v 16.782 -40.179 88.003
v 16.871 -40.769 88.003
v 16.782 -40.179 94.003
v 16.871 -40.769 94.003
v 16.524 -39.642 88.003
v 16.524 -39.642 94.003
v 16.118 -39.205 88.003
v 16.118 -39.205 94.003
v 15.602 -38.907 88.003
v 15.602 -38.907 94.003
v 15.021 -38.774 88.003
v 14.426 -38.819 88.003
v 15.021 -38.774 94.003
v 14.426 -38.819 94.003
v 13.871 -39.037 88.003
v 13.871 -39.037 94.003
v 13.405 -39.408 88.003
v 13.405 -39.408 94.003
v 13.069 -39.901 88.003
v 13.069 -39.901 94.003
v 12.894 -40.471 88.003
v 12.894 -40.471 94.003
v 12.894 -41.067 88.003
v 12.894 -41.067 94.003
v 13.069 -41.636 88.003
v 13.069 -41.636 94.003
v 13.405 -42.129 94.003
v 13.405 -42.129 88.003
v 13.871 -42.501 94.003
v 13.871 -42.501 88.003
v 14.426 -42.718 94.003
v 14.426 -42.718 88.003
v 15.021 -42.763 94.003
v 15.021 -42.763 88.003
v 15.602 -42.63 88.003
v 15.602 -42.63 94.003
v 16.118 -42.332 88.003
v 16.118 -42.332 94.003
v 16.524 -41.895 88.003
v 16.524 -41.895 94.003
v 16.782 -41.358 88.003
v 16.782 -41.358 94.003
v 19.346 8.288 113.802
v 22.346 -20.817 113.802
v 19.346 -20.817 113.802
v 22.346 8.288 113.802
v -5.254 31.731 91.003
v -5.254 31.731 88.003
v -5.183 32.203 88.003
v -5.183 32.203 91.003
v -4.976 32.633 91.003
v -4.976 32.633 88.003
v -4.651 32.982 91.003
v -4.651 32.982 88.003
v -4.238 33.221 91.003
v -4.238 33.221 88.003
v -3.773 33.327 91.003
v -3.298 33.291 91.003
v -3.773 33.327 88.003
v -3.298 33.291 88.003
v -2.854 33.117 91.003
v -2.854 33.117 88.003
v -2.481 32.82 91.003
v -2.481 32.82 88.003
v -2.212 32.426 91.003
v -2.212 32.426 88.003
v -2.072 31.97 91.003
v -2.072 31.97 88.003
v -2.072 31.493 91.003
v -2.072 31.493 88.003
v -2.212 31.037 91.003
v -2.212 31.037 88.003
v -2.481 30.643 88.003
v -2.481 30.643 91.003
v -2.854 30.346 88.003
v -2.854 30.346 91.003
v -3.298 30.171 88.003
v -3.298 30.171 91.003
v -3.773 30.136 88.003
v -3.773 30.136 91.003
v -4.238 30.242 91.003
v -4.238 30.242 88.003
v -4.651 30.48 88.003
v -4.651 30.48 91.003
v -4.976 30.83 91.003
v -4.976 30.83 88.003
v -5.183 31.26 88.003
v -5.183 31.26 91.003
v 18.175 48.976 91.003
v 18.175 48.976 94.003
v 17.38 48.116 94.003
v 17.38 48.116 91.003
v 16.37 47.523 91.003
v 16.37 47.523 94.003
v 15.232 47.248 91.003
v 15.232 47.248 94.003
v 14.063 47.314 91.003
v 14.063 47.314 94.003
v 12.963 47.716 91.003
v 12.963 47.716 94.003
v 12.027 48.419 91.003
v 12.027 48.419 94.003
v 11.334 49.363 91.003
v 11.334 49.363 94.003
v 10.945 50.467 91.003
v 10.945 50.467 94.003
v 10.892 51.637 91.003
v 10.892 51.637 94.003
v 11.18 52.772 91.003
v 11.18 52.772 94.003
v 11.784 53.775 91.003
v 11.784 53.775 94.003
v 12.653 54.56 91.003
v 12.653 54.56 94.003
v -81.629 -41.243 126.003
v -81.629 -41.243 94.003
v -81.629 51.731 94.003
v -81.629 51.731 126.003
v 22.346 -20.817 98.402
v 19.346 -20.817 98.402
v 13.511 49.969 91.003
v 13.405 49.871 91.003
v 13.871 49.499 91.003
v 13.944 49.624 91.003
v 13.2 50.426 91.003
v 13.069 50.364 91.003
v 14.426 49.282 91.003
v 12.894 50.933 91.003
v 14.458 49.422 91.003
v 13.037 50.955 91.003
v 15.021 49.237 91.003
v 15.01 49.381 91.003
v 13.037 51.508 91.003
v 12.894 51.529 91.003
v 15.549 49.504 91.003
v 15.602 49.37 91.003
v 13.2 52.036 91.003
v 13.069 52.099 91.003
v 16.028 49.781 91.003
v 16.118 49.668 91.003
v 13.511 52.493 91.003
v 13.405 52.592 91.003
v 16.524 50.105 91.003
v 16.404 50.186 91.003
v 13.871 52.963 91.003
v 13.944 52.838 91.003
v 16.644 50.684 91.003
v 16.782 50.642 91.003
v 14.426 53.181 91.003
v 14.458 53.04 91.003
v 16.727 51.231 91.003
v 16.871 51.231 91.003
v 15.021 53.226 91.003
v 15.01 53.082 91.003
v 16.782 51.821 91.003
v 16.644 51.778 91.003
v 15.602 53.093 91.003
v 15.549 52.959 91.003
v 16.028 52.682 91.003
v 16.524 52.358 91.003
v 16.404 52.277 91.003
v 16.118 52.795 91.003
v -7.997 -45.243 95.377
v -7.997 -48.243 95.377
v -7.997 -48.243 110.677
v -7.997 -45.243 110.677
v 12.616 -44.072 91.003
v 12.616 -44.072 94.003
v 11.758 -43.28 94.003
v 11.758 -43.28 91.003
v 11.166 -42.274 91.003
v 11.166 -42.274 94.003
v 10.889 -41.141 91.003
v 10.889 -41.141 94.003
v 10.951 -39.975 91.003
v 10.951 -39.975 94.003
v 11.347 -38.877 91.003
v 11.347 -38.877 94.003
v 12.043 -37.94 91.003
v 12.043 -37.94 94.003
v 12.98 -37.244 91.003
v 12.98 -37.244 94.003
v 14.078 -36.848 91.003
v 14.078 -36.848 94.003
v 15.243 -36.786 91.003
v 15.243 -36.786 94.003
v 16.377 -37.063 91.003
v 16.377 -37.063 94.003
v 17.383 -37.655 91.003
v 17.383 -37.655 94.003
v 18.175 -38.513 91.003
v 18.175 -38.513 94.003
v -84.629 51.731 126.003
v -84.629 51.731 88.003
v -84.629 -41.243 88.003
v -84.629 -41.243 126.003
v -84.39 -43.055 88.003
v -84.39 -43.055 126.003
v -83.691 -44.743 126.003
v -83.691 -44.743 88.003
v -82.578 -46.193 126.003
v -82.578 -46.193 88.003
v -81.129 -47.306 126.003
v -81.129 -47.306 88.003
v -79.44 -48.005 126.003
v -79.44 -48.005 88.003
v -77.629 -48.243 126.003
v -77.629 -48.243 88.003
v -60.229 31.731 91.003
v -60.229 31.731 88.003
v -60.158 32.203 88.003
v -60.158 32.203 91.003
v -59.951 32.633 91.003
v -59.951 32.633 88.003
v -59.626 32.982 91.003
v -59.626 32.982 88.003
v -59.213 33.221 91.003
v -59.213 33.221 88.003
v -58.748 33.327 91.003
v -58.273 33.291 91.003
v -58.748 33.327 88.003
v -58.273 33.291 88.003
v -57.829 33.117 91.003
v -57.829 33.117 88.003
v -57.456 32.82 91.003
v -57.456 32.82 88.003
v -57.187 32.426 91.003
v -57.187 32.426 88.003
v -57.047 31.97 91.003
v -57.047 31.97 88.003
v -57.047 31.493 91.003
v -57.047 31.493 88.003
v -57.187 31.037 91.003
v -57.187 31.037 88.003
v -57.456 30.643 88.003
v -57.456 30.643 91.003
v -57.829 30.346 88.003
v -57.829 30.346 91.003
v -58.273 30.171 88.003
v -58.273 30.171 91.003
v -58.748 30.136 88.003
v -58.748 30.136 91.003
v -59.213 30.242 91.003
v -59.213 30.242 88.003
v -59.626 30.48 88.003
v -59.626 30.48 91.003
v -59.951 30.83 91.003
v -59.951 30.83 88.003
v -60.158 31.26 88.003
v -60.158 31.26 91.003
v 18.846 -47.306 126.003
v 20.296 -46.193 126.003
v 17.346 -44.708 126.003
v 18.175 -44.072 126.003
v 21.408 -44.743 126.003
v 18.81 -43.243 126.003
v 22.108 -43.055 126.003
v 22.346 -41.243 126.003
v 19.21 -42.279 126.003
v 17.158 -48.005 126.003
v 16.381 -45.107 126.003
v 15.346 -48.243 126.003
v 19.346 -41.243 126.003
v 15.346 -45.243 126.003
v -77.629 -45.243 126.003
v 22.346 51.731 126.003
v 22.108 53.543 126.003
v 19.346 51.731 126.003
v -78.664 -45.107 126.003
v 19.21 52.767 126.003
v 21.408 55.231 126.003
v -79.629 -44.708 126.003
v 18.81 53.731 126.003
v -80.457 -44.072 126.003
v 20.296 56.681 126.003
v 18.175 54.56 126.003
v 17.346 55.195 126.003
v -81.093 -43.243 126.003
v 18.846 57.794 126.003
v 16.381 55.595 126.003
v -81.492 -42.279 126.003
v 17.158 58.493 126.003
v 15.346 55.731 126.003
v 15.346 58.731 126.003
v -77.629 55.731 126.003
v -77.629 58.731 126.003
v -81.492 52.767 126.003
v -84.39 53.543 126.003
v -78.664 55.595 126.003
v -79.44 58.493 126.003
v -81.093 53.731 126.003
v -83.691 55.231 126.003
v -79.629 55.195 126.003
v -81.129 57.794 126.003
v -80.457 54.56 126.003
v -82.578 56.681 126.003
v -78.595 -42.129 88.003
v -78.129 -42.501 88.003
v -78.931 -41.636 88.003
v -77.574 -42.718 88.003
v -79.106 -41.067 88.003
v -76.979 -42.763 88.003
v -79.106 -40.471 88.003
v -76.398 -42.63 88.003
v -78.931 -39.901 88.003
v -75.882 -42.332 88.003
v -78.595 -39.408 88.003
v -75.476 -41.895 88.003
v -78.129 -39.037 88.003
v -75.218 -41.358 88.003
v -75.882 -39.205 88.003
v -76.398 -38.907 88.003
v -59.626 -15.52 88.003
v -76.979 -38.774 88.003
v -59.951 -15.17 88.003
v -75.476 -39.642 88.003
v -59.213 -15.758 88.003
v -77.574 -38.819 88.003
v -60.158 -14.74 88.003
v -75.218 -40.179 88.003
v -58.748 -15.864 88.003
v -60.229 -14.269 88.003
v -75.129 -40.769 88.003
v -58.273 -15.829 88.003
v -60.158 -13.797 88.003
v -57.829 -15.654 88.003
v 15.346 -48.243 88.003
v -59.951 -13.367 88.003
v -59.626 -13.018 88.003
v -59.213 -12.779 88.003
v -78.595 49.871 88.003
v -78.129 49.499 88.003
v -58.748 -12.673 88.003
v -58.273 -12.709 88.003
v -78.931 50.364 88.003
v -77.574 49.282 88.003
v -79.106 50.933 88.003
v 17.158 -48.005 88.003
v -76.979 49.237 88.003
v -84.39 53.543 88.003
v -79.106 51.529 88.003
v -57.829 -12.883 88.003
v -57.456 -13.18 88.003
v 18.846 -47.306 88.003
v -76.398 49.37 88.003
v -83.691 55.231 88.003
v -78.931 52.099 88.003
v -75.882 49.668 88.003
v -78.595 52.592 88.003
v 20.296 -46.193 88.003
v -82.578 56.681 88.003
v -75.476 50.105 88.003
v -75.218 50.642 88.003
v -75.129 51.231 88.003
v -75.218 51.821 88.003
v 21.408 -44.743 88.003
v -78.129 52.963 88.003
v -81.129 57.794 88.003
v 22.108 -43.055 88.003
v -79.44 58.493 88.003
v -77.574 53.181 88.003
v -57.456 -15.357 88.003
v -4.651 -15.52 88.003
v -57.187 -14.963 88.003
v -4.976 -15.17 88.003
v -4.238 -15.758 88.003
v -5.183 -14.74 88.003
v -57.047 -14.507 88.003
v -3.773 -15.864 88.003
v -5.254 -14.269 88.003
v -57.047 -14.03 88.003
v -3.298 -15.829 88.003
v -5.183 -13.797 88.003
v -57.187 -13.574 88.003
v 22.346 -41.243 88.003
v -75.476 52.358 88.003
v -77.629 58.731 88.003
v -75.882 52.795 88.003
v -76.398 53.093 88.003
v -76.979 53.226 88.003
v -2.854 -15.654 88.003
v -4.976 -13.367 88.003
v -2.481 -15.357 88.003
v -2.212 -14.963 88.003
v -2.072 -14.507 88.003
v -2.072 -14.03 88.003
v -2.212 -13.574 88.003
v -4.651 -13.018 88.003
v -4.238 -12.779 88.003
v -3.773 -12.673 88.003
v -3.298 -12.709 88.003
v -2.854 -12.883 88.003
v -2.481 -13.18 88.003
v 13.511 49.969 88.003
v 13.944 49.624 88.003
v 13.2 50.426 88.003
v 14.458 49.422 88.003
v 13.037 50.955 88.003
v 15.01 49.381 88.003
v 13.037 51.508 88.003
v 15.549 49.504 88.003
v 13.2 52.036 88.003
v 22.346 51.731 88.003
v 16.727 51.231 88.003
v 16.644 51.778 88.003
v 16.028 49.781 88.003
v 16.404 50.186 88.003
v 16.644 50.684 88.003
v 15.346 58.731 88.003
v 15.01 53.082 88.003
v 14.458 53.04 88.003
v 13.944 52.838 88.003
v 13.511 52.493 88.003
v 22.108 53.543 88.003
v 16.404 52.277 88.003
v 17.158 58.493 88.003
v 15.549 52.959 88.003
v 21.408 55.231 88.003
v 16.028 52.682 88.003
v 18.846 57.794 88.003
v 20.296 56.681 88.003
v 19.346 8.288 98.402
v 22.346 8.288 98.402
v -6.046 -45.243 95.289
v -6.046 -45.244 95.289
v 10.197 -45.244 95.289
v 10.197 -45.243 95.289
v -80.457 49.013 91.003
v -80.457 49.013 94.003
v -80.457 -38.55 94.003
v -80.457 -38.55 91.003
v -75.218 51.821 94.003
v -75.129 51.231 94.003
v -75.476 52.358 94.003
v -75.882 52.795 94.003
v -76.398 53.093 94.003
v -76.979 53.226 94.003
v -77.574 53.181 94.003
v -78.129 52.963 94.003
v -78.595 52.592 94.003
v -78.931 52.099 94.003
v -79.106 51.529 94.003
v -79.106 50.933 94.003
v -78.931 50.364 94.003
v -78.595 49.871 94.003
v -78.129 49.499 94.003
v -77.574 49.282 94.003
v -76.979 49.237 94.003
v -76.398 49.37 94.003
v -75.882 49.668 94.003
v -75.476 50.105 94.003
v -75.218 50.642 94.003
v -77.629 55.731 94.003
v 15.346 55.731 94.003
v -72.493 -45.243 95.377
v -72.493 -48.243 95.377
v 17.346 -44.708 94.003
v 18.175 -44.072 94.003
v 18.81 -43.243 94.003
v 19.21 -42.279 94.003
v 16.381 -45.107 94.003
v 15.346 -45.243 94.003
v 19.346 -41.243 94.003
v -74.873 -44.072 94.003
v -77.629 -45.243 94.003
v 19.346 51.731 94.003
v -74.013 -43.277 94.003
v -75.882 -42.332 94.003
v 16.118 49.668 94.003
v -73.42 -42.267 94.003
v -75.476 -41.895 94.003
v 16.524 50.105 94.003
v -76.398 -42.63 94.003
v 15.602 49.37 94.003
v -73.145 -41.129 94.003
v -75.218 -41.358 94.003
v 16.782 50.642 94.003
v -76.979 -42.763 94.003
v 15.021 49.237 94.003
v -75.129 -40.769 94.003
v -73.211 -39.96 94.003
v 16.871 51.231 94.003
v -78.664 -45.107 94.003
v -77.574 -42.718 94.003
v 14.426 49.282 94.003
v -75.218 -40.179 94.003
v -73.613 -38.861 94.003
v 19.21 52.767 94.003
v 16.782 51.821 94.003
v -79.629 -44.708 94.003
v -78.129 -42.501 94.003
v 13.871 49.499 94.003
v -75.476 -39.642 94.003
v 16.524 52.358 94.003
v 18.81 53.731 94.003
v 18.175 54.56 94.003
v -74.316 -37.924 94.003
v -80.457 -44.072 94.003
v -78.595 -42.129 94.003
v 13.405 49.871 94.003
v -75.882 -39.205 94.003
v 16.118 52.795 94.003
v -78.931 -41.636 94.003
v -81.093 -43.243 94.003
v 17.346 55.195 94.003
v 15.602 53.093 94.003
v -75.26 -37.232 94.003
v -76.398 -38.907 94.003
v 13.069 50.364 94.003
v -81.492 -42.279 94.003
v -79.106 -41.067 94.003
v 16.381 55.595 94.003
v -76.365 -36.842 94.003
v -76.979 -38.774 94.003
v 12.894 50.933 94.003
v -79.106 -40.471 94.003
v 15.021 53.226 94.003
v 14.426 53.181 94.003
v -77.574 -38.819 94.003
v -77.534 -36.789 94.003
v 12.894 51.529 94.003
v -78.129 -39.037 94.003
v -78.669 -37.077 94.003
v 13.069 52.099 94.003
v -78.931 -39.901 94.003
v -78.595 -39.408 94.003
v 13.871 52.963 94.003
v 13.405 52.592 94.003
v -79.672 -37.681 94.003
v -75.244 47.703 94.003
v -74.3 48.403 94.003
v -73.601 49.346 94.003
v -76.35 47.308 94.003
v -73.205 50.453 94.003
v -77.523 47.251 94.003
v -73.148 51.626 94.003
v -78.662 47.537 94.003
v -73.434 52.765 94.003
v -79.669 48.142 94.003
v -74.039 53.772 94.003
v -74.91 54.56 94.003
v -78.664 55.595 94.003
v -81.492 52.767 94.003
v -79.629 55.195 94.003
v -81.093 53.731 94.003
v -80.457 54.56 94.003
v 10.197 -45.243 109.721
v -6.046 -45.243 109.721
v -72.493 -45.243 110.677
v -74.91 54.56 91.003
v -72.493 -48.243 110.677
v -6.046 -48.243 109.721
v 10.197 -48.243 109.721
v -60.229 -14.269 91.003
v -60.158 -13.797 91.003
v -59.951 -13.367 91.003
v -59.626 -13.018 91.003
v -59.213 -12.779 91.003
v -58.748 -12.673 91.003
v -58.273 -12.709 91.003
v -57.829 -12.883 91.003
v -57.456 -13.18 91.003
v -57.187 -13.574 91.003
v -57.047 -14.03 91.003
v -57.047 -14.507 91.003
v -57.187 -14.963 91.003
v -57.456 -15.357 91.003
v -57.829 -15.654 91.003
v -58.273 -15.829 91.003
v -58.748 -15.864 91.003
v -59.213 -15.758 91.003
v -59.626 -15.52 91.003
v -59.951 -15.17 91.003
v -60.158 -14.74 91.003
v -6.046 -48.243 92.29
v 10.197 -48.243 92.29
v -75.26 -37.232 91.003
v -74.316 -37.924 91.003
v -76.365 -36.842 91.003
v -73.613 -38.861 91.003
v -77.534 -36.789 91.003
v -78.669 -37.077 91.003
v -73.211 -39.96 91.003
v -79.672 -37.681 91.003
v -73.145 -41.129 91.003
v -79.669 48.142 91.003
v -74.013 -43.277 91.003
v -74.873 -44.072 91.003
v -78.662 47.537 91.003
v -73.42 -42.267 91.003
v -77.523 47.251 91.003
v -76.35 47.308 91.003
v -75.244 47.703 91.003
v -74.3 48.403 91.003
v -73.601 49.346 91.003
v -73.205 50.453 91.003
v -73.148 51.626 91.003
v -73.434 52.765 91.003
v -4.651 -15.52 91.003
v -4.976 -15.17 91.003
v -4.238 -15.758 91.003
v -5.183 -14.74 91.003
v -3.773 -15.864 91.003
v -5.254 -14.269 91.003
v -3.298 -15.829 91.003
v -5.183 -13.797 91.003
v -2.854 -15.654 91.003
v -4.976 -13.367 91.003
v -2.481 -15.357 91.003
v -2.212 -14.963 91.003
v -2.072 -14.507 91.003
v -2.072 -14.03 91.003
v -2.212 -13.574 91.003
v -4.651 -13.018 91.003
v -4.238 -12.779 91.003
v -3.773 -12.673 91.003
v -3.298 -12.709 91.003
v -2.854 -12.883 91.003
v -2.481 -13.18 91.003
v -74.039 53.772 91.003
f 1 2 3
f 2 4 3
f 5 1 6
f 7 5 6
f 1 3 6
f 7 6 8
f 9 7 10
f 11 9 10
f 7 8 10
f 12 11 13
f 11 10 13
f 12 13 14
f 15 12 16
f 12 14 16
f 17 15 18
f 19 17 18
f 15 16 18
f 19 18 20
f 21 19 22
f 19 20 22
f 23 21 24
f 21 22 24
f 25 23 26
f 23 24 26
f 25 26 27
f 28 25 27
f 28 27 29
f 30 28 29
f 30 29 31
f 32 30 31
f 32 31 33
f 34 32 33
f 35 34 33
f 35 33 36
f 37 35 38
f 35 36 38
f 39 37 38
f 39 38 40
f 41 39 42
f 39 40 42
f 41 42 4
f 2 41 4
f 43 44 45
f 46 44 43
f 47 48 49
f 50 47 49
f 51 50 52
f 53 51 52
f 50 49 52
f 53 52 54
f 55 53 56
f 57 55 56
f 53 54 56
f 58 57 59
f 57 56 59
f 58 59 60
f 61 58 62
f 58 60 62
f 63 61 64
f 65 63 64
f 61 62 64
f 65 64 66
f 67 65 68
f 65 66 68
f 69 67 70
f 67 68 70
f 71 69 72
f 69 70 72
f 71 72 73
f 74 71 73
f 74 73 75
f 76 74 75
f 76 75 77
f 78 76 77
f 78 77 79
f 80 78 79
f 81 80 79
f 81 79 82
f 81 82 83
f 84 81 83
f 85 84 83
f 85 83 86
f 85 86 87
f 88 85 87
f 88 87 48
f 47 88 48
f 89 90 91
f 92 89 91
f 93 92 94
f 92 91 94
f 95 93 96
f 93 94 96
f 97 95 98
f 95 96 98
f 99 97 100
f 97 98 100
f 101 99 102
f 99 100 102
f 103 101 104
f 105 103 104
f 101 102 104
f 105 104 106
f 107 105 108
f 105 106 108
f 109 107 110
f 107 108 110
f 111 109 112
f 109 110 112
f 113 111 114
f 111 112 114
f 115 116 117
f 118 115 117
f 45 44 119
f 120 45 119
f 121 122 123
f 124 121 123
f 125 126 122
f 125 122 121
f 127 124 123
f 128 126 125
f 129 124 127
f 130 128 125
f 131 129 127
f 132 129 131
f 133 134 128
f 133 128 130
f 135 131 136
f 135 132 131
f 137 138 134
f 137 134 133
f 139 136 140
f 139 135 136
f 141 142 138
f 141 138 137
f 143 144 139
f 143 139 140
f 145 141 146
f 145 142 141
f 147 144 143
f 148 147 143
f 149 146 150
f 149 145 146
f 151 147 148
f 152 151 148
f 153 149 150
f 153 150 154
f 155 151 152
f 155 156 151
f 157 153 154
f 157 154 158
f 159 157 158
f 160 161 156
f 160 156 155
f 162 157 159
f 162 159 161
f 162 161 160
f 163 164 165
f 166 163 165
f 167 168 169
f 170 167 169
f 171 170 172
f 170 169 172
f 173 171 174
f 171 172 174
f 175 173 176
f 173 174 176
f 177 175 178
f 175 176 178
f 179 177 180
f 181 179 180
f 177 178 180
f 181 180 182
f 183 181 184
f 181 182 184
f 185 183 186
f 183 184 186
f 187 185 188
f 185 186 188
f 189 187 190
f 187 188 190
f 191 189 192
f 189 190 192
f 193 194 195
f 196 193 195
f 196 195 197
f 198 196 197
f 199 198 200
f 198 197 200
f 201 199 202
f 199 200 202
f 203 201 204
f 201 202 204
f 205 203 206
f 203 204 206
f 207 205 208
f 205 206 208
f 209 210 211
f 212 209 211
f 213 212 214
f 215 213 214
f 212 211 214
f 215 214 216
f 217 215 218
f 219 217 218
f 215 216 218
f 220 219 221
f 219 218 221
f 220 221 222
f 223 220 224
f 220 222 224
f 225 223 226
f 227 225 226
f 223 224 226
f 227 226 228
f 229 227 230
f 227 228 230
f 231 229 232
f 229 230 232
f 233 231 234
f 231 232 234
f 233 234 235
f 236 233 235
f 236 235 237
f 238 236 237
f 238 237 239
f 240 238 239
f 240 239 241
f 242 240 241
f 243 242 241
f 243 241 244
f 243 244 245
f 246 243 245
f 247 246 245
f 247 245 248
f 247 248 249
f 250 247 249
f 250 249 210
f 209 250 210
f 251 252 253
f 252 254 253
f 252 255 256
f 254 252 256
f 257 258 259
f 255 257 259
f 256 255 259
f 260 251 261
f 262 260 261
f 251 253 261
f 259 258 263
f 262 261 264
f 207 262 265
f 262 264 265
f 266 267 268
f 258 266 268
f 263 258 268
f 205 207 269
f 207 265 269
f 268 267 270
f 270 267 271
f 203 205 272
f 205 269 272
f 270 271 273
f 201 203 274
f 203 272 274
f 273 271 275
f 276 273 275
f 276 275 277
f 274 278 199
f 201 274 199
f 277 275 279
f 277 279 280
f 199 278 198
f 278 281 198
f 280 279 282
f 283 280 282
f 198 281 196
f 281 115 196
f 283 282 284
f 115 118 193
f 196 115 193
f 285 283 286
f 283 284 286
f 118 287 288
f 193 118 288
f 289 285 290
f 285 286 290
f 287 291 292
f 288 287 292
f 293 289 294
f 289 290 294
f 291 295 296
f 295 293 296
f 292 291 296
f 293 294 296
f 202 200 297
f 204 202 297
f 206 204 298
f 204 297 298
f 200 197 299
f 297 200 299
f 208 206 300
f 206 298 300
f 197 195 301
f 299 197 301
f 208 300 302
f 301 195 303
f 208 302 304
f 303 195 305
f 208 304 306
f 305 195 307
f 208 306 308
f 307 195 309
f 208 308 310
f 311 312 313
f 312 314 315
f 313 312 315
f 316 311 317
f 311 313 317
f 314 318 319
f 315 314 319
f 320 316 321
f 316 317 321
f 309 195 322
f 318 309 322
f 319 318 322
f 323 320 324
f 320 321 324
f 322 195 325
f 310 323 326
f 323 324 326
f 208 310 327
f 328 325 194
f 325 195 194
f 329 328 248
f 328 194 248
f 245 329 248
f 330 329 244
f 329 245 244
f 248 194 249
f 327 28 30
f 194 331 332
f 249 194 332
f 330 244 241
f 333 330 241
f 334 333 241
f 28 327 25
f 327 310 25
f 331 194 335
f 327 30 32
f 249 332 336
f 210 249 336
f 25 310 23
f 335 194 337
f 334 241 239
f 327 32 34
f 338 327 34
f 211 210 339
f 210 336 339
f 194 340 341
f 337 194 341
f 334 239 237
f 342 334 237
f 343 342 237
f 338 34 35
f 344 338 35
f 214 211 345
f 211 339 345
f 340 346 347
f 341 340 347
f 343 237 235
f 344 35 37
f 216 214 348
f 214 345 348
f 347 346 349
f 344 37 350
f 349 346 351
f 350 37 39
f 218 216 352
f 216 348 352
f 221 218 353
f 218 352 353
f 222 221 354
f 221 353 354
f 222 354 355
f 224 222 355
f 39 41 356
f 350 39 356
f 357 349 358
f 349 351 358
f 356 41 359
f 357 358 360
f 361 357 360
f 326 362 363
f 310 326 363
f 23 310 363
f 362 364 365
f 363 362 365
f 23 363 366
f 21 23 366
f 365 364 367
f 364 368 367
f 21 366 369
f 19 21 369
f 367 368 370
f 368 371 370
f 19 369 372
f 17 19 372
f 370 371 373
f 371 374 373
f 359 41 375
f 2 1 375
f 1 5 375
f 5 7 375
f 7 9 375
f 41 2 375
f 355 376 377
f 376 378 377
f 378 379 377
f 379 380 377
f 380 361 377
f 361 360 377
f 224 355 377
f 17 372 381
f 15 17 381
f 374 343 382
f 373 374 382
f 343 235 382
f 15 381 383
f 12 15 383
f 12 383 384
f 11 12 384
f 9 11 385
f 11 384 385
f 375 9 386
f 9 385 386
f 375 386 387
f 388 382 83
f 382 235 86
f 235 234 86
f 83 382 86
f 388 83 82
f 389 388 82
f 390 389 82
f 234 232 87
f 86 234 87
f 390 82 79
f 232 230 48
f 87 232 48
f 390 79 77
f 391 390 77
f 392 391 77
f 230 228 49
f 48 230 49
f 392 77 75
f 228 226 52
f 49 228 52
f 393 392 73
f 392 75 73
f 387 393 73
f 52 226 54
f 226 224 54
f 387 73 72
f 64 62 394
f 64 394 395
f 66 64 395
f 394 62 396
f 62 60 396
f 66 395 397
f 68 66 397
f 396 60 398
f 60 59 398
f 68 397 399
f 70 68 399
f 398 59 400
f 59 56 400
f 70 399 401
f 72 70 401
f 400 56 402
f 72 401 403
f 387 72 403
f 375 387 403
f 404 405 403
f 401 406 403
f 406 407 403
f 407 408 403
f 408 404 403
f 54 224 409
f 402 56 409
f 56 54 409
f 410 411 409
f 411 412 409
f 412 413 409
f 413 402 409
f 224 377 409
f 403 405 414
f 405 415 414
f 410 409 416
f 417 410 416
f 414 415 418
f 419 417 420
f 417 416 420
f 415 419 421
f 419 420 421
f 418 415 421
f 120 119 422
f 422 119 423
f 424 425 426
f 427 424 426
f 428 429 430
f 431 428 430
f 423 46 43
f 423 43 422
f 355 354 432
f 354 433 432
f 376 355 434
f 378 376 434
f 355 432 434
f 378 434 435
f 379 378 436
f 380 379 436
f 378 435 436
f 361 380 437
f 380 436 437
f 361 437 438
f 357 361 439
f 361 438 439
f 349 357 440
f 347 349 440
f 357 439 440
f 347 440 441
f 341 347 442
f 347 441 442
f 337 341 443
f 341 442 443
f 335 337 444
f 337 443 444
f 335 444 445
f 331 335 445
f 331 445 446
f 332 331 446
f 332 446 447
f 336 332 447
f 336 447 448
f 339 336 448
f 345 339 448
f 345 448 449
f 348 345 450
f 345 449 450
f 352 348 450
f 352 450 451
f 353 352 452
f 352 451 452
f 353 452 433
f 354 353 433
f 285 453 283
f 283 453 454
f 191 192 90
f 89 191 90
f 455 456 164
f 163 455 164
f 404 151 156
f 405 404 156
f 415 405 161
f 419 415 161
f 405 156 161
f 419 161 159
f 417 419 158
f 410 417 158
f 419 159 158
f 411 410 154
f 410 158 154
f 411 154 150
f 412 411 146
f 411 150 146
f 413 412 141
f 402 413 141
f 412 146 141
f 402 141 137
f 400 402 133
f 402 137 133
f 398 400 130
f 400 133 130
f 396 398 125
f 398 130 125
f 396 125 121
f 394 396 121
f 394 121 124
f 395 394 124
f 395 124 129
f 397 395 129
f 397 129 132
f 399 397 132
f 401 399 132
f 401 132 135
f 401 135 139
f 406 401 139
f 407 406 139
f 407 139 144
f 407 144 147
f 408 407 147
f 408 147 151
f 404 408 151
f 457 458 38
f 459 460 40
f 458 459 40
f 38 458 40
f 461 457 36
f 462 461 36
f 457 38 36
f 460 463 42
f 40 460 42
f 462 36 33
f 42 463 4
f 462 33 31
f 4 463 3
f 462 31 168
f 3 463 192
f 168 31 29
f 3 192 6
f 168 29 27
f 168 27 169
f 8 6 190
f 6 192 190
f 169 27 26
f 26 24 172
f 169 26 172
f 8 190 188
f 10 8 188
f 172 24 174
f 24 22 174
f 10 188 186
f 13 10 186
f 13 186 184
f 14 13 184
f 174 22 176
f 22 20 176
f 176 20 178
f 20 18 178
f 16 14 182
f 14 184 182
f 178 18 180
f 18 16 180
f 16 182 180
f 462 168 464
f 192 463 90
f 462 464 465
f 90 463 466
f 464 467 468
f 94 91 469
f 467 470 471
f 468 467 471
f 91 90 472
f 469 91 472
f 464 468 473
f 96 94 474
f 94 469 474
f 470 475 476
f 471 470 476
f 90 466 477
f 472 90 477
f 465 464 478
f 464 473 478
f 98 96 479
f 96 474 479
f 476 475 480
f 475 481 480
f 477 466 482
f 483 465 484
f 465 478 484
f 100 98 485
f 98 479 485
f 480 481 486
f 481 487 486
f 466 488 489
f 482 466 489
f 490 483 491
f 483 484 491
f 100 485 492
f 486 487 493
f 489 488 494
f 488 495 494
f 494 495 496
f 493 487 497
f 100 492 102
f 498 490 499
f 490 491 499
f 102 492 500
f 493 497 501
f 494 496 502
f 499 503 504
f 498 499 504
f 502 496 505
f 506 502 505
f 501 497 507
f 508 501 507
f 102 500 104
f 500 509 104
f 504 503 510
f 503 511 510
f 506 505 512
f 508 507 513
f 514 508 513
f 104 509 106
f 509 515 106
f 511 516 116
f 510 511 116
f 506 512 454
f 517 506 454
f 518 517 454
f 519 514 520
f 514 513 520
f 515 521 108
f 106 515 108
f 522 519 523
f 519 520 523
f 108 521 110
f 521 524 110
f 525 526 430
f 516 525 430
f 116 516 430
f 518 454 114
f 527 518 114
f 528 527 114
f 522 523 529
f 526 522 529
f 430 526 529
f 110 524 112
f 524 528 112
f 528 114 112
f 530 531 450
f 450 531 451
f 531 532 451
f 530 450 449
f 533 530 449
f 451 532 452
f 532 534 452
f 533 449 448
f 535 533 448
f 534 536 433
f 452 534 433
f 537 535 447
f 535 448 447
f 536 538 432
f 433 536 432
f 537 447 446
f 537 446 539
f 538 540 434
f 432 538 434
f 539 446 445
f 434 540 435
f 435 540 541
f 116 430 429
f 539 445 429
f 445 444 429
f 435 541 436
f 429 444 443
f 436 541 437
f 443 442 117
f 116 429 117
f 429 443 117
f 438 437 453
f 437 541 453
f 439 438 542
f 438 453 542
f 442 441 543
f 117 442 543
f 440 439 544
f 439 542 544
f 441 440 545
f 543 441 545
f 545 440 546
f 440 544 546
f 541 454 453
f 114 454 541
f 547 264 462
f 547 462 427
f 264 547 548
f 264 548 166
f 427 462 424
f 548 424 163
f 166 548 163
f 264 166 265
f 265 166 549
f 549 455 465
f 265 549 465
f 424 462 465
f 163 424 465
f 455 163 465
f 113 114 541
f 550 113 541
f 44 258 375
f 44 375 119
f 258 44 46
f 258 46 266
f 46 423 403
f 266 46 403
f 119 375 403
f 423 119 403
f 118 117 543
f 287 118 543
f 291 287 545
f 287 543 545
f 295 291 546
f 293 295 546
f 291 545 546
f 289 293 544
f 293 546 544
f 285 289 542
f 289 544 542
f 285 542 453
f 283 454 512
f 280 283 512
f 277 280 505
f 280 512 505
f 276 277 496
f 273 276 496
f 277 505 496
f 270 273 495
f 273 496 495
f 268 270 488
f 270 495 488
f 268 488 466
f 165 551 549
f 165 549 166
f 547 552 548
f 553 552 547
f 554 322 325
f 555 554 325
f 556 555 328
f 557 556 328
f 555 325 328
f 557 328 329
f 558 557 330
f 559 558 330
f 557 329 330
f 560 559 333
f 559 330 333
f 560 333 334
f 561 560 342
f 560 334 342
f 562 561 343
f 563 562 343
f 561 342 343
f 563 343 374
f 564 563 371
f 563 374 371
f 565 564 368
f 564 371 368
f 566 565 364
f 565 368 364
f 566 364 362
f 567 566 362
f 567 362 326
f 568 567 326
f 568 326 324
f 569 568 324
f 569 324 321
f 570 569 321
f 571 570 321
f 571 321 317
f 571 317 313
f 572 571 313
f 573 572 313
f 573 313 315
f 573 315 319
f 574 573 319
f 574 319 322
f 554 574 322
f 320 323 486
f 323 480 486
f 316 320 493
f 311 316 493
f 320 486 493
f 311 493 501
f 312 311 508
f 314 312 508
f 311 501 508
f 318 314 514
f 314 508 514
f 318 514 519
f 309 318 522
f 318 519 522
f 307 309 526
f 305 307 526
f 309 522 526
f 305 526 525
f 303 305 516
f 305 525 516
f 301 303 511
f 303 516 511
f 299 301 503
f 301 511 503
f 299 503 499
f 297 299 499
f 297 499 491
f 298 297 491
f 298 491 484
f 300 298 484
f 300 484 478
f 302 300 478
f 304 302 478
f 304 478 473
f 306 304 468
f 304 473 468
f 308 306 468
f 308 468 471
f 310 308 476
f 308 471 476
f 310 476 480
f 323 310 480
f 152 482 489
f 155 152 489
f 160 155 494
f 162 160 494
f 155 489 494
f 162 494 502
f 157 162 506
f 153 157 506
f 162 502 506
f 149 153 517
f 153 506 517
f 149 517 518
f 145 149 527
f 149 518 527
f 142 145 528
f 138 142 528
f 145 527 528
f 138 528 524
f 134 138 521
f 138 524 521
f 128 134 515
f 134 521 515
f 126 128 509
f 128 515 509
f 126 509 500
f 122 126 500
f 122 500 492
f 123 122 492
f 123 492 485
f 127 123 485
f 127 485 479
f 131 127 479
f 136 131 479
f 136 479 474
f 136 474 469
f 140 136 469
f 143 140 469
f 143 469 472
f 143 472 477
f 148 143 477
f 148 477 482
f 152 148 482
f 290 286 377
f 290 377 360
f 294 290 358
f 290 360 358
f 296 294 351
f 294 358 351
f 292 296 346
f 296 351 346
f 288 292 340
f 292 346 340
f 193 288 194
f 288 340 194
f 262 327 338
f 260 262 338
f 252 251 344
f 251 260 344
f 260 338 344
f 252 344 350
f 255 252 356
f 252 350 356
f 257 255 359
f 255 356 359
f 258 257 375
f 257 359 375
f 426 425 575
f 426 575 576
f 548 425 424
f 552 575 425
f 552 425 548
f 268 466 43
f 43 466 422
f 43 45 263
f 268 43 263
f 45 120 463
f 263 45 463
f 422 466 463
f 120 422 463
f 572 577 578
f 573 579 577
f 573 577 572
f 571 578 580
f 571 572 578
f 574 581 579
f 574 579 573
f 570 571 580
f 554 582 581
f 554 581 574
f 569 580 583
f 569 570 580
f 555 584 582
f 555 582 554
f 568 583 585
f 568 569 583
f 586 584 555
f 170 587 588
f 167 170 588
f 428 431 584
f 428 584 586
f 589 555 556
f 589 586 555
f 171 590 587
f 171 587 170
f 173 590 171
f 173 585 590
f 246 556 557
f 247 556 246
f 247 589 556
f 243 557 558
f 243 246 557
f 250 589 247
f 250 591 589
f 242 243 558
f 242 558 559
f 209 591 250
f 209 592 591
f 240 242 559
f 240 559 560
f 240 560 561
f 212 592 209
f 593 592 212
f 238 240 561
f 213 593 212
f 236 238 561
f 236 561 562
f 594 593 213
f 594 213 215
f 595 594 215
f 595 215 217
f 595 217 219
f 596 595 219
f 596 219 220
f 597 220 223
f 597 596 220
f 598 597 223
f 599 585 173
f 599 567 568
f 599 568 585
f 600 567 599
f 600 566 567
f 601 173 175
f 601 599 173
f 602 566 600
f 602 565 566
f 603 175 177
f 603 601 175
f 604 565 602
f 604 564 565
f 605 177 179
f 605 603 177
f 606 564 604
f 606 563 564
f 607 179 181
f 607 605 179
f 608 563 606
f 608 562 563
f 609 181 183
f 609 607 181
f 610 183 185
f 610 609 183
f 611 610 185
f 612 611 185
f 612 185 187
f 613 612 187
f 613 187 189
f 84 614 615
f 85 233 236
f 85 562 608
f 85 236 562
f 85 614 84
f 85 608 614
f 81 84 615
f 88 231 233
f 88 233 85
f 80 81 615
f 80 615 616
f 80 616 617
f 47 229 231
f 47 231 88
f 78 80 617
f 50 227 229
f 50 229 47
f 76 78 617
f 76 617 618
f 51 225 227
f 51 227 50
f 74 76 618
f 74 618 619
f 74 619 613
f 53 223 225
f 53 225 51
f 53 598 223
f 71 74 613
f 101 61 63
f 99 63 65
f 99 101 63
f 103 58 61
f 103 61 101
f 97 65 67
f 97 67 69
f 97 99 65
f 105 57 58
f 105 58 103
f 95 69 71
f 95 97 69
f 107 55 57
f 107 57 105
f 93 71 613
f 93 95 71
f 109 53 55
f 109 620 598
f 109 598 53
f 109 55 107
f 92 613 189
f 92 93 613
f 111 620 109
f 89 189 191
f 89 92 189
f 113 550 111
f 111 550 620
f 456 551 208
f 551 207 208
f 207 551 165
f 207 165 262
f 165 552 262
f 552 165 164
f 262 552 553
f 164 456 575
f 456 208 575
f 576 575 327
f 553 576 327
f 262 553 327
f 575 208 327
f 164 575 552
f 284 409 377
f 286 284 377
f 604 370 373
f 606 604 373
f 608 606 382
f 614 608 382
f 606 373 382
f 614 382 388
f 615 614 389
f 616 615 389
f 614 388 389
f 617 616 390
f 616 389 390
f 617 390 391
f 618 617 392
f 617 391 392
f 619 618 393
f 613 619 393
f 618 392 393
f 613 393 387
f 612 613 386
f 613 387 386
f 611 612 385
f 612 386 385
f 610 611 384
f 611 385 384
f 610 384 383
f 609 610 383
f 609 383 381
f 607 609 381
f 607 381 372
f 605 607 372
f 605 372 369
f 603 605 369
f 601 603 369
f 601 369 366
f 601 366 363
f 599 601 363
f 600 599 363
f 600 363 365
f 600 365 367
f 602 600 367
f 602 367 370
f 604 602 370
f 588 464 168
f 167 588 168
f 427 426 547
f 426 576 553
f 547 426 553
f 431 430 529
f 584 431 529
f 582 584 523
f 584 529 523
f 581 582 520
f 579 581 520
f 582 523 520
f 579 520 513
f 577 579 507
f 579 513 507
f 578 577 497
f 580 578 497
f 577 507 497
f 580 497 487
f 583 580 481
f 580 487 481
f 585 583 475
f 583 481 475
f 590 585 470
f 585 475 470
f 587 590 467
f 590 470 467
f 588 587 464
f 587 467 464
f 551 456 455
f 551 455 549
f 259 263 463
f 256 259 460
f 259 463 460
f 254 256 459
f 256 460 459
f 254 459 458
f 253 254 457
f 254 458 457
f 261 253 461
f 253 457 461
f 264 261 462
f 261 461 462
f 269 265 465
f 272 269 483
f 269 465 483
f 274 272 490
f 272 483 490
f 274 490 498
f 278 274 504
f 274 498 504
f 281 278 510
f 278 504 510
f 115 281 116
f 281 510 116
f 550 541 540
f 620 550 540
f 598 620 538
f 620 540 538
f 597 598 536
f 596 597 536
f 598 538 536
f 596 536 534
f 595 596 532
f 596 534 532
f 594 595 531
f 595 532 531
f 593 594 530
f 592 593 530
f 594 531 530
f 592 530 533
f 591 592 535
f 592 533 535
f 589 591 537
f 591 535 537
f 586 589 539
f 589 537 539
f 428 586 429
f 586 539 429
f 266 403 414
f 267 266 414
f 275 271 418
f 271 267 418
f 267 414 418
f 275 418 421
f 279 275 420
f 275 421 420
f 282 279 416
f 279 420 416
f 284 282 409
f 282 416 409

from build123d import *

# Parameters (mm, degrees)
SCHIZZO1_W                        = 100.974800609
SCHIZZO1_H                        = 100.97480061
ESTRUSIONE_ESTRUSIONE1_DEPTH      = 3
SCHIZZO3_R                        = 2
TAGLIO_ESTRUSIONE1_DEPTH          = 10
RACCORDO1_R                       = 4
TAGLIO_ESTRUSIONE2_DEPTH          = 3
ESTRUSIONE_ESTRUSIONE2_DEPTH      = 32
ESTRUSIONE_ESTRUSIONE2_DEPTH_BACK = 3
ESTRUSIONE_ESTRUSIONE3_START      = 3
ESTRUSIONE_ESTRUSIONE3_DEPTH      = 3
TAGLIO_ESTRUSIONE3_REACH          = 187.694
SCHIZZO7_W                        = 16.242748833
SCHIZZO7_H                        = 14.432058418
SCHIZZO7_W_2                      = 64.496064987
SCHIZZO7_H_2                      = 15.3
TAGLIO_ESTRUSIONE4_REACH          = 177.413
SCHIZZO8_W                        = 15.4
SCHIZZO8_H                        = 29.105346697
SMUSSO1_SIZE                      = 3
SCHIZZO9_R                        = 2
SCHIZZO9_R_2                      = 1.85551968
TAGLIO_ESTRUSIONE5_DEPTH          = 108.867451135
SCHIZZO10_R                       = 1.6
TAGLIO_ESTRUSIONE6_DEPTH          = 5


with BuildPart() as part:
    # Schizzo1 → Estrusione-Estrusione1 (new body)
    with BuildSketch(Plane(origin=(0, 0, 94.00326253), x_dir=(-1, 0, 0), z_dir=(0, 0, -1))):
        with Locations((31.141269188, 5.2439824)):
            Rectangle(SCHIZZO1_W, SCHIZZO1_H)
    extrude(amount=ESTRUSIONE_ESTRUSIONE1_DEPTH)

    # Schizzo3 → Taglio-Estrusione1 (cut)
    with BuildSketch(Plane.XY.offset(94.00326253)):
        with Locations((-77.128669492, 51.231382705)):
            Circle(SCHIZZO3_R)
        with Locations((14.871330508, 51.231382705)):
            Circle(SCHIZZO3_R)
        with Locations((-77.128669492, -40.768617295)):
            Circle(SCHIZZO3_R)
        with Locations((14.871330508, -40.768617295)):
            Circle(SCHIZZO3_R)
    extrude(amount=-TAGLIO_ESTRUSIONE1_DEPTH, mode=Mode.SUBTRACT)

    # Raccordo1
    raccordo1_edges = [part.edges().sort_by_distance(p)[0] for p in [
        (19.346131117, 55.731382705, 92.50326253),
        (-81.628669492, 55.731382705, 92.50326253),
        (-81.628669492, -45.243417905, 92.50326253),
        (19.346131117, -45.243417905, 92.50326253),
    ]]
    fillet(raccordo1_edges, radius=RACCORDO1_R)

    # Schizzo4 → Taglio-Estrusione2 (cut)
    with BuildSketch(Plane.XY.offset(94.00326253)):
        with BuildLine():
            Line((-74.872857768, -44.07184503), (12.615518783, -44.07184503))
            ThreePointArc((12.615518783, -44.07184503), (12.042903383, -37.940190171), (18.174558242, -38.512805571))
            Line((18.174558242, -38.512805571), (18.174558242, 48.97557098))
            ThreePointArc((18.174558242, 48.97557098), (12.027018614, 48.418930065), (12.652868681, 54.559809829))
            Line((12.652868681, 54.559809829), (-74.910207666, 54.559809829))
            ThreePointArc((-74.910207666, 54.559809829), (-74.300242368, 48.40295558), (-80.457096617, 49.012920878))
            Line((-80.457096617, 49.012920878), (-80.457096617, -38.550155469))
            ThreePointArc((-80.457096617, -38.550155469), (-74.316216853, -37.924305402), (-74.872857768, -44.07184503))
        make_face()
    extrude(amount=-TAGLIO_ESTRUSIONE2_DEPTH, mode=Mode.SUBTRACT)

    # Schizzo5 → Estrusione-Estrusione2 (add, two sides: drawn at the far end of the back side and taken through both)
    with BuildSketch(Plane.XY.offset(94.00326253).offset(-ESTRUSIONE_ESTRUSIONE2_DEPTH_BACK)):
        with BuildLine():
            Line((-77.628669492, 58.731382705), (15.346131117, 58.731382705))
            ThreePointArc((15.346131117, 58.731382705), (20.295878585, 56.681130173), (22.346131117, 51.731382705))
            Line((22.346131117, 51.731382705), (22.346131117, -41.243417905))
            ThreePointArc((22.346131117, -41.243417905), (20.295878585, -46.193165373), (15.346131117, -48.243417905))
            Line((15.346131117, -48.243417905), (-77.628669492, -48.243417905))
            ThreePointArc((-77.628669492, -48.243417905), (-82.578416961, -46.193165373), (-84.628669492, -41.243417905))
            Line((-84.628669492, -41.243417905), (-84.628669492, 51.731382705))
            ThreePointArc((-84.628669492, 51.731382705), (-82.578416961, 56.681130173), (-77.628669492, 58.731382705))
        make_face()
        with BuildLine():
            Line((-77.628669492, 55.731382705), (15.346131117, 55.731382705))
            ThreePointArc((15.346131117, 55.731382705), (18.174558242, 54.559809829), (19.346131117, 51.731382705))
            Line((19.346131117, 51.731382705), (19.346131117, -41.243417905))
            ThreePointArc((19.346131117, -41.243417905), (18.174558242, -44.07184503), (15.346131117, -45.243417905))
            Line((15.346131117, -45.243417905), (-77.628669492, -45.243417905))
            ThreePointArc((-77.628669492, -45.243417905), (-80.457096617, -44.07184503), (-81.628669492, -41.243417905))
            Line((-81.628669492, -41.243417905), (-81.628669492, 51.731382705))
            ThreePointArc((-81.628669492, 51.731382705), (-80.457096617, 54.559809829), (-77.628669492, 55.731382705))
        make_face(mode=Mode.SUBTRACT)
    extrude(amount=ESTRUSIONE_ESTRUSIONE2_DEPTH + ESTRUSIONE_ESTRUSIONE2_DEPTH_BACK)

    # Schizzo6 → Estrusione-Estrusione3 (add)
    with BuildSketch(Plane(origin=(0, 0, 91.00326253), x_dir=(-1, 0, 0), z_dir=(0, 0, -1)).offset(ESTRUSIONE_ESTRUSIONE3_START)):
        with BuildLine():
            Line((-15.346131117, 58.731382705), (77.628669492, 58.731382705))
            ThreePointArc((77.628669492, 58.731382705), (82.578416961, 56.681130173), (84.628669492, 51.731382705))
            Line((84.628669492, 51.731382705), (84.628669492, -41.243417905))
            ThreePointArc((84.628669492, -41.243417905), (82.578416961, -46.193165373), (77.628669492, -48.243417905))
            Line((77.628669492, -48.243417905), (-15.346131117, -48.243417905))
            ThreePointArc((-15.346131117, -48.243417905), (-20.295878585, -46.193165373), (-22.346131117, -41.243417905))
            Line((-22.346131117, -41.243417905), (-22.346131117, 51.731382705))
            ThreePointArc((-22.346131117, 51.731382705), (-20.295878585, 56.681130173), (-15.346131117, 58.731382705))
        make_face()
    extrude(amount=-ESTRUSIONE_ESTRUSIONE3_DEPTH)

    # Schizzo7 → Taglio-Estrusione3 (cut, up to next)
    with BuildSketch(Plane.XZ.offset(48.243417905), mode=Mode.PRIVATE) as taglio_estrusione3_sk1:
        with Locations((2.075800916, 102.505448711)):
            Rectangle(SCHIZZO7_W, SCHIZZO7_H)
    taglio_estrusione3_tool1 = extrude(taglio_estrusione3_sk1.sketch, amount=-TAGLIO_ESTRUSIONE3_REACH, mode=Mode.PRIVATE) & part.part
    # Schizzo7 → Taglio-Estrusione3 (cut, up to next)
    with BuildSketch(Plane.XZ.offset(48.243417905), mode=Mode.PRIVATE) as taglio_estrusione3_sk2:
        with Locations((-40.245307891, 103.027287944)):
            Rectangle(SCHIZZO7_W_2, SCHIZZO7_H_2)
    taglio_estrusione3_tool2 = extrude(taglio_estrusione3_sk2.sketch, amount=-TAGLIO_ESTRUSIONE3_REACH, mode=Mode.PRIVATE) & part.part
    add(taglio_estrusione3_tool1.solids().sort_by_distance((2.075801, -48.243418, 102.505449))[0], mode=Mode.SUBTRACT)
    add(taglio_estrusione3_tool2.solids().sort_by_distance((-40.245308, -48.243418, 103.027288))[0], mode=Mode.SUBTRACT)

    # Schizzo8 → Taglio-Estrusione4 (cut, up to next)
    with BuildSketch(Plane(origin=(22.346131117, 0, 0), x_dir=(0, 0, -1), z_dir=(1, 0, 0)), mode=Mode.PRIVATE) as taglio_estrusione4_sk1:
        with Locations((-106.101551061, -6.264379468)):
            Rectangle(SCHIZZO8_W, SCHIZZO8_H)
    taglio_estrusione4_tool1 = extrude(taglio_estrusione4_sk1.sketch, amount=-TAGLIO_ESTRUSIONE4_REACH, mode=Mode.PRIVATE) & part.part
    add(taglio_estrusione4_tool1.solids().sort_by_distance((22.346131, -6.264379, 106.101551))[0], mode=Mode.SUBTRACT)

    # Smusso1
    smusso1_edges = [part.edges().sort_by_distance(p)[0] for p in [
        (2.075800916, -48.243417905, 95.289419502),
    ]]
    chamfer(smusso1_edges, length=SMUSSO1_SIZE - 0.0001)  # a hair under: the kernel refuses the full size

    # Schizzo9 → Taglio-Estrusione5 (cut, through all)
    with BuildSketch(Plane.XY.offset(94.00326253)):
        with Locations((-77.128669492, 51.231382705)):
            Circle(SCHIZZO9_R)
        with Locations((14.871330508, 51.231382705)):
            Circle(SCHIZZO9_R_2)
        with Locations((14.871330508, -40.768617295)):
            Circle(SCHIZZO9_R)
        with Locations((-77.128669492, -40.768617295)):
            Circle(SCHIZZO9_R)
    extrude(amount=-TAGLIO_ESTRUSIONE5_DEPTH, mode=Mode.SUBTRACT)

    # Schizzo10 → Taglio-Estrusione6 (cut)
    with BuildSketch(Plane(origin=(0, 0, 88.00326253), x_dir=(-1, 0, 0), z_dir=(0, 0, -1))):
        with Locations((3.653868883, 31.731382705)):
            Circle(SCHIZZO10_R)
        with Locations((3.653868883, -14.268617295)):
            Circle(SCHIZZO10_R)
        with Locations((58.628669492, -14.268617295)):
            Circle(SCHIZZO10_R)
        with Locations((58.628669492, 31.731382705)):
            Circle(SCHIZZO10_R)
    extrude(amount=-TAGLIO_ESTRUSIONE6_DEPTH, mode=Mode.SUBTRACT)


solid = part.part
